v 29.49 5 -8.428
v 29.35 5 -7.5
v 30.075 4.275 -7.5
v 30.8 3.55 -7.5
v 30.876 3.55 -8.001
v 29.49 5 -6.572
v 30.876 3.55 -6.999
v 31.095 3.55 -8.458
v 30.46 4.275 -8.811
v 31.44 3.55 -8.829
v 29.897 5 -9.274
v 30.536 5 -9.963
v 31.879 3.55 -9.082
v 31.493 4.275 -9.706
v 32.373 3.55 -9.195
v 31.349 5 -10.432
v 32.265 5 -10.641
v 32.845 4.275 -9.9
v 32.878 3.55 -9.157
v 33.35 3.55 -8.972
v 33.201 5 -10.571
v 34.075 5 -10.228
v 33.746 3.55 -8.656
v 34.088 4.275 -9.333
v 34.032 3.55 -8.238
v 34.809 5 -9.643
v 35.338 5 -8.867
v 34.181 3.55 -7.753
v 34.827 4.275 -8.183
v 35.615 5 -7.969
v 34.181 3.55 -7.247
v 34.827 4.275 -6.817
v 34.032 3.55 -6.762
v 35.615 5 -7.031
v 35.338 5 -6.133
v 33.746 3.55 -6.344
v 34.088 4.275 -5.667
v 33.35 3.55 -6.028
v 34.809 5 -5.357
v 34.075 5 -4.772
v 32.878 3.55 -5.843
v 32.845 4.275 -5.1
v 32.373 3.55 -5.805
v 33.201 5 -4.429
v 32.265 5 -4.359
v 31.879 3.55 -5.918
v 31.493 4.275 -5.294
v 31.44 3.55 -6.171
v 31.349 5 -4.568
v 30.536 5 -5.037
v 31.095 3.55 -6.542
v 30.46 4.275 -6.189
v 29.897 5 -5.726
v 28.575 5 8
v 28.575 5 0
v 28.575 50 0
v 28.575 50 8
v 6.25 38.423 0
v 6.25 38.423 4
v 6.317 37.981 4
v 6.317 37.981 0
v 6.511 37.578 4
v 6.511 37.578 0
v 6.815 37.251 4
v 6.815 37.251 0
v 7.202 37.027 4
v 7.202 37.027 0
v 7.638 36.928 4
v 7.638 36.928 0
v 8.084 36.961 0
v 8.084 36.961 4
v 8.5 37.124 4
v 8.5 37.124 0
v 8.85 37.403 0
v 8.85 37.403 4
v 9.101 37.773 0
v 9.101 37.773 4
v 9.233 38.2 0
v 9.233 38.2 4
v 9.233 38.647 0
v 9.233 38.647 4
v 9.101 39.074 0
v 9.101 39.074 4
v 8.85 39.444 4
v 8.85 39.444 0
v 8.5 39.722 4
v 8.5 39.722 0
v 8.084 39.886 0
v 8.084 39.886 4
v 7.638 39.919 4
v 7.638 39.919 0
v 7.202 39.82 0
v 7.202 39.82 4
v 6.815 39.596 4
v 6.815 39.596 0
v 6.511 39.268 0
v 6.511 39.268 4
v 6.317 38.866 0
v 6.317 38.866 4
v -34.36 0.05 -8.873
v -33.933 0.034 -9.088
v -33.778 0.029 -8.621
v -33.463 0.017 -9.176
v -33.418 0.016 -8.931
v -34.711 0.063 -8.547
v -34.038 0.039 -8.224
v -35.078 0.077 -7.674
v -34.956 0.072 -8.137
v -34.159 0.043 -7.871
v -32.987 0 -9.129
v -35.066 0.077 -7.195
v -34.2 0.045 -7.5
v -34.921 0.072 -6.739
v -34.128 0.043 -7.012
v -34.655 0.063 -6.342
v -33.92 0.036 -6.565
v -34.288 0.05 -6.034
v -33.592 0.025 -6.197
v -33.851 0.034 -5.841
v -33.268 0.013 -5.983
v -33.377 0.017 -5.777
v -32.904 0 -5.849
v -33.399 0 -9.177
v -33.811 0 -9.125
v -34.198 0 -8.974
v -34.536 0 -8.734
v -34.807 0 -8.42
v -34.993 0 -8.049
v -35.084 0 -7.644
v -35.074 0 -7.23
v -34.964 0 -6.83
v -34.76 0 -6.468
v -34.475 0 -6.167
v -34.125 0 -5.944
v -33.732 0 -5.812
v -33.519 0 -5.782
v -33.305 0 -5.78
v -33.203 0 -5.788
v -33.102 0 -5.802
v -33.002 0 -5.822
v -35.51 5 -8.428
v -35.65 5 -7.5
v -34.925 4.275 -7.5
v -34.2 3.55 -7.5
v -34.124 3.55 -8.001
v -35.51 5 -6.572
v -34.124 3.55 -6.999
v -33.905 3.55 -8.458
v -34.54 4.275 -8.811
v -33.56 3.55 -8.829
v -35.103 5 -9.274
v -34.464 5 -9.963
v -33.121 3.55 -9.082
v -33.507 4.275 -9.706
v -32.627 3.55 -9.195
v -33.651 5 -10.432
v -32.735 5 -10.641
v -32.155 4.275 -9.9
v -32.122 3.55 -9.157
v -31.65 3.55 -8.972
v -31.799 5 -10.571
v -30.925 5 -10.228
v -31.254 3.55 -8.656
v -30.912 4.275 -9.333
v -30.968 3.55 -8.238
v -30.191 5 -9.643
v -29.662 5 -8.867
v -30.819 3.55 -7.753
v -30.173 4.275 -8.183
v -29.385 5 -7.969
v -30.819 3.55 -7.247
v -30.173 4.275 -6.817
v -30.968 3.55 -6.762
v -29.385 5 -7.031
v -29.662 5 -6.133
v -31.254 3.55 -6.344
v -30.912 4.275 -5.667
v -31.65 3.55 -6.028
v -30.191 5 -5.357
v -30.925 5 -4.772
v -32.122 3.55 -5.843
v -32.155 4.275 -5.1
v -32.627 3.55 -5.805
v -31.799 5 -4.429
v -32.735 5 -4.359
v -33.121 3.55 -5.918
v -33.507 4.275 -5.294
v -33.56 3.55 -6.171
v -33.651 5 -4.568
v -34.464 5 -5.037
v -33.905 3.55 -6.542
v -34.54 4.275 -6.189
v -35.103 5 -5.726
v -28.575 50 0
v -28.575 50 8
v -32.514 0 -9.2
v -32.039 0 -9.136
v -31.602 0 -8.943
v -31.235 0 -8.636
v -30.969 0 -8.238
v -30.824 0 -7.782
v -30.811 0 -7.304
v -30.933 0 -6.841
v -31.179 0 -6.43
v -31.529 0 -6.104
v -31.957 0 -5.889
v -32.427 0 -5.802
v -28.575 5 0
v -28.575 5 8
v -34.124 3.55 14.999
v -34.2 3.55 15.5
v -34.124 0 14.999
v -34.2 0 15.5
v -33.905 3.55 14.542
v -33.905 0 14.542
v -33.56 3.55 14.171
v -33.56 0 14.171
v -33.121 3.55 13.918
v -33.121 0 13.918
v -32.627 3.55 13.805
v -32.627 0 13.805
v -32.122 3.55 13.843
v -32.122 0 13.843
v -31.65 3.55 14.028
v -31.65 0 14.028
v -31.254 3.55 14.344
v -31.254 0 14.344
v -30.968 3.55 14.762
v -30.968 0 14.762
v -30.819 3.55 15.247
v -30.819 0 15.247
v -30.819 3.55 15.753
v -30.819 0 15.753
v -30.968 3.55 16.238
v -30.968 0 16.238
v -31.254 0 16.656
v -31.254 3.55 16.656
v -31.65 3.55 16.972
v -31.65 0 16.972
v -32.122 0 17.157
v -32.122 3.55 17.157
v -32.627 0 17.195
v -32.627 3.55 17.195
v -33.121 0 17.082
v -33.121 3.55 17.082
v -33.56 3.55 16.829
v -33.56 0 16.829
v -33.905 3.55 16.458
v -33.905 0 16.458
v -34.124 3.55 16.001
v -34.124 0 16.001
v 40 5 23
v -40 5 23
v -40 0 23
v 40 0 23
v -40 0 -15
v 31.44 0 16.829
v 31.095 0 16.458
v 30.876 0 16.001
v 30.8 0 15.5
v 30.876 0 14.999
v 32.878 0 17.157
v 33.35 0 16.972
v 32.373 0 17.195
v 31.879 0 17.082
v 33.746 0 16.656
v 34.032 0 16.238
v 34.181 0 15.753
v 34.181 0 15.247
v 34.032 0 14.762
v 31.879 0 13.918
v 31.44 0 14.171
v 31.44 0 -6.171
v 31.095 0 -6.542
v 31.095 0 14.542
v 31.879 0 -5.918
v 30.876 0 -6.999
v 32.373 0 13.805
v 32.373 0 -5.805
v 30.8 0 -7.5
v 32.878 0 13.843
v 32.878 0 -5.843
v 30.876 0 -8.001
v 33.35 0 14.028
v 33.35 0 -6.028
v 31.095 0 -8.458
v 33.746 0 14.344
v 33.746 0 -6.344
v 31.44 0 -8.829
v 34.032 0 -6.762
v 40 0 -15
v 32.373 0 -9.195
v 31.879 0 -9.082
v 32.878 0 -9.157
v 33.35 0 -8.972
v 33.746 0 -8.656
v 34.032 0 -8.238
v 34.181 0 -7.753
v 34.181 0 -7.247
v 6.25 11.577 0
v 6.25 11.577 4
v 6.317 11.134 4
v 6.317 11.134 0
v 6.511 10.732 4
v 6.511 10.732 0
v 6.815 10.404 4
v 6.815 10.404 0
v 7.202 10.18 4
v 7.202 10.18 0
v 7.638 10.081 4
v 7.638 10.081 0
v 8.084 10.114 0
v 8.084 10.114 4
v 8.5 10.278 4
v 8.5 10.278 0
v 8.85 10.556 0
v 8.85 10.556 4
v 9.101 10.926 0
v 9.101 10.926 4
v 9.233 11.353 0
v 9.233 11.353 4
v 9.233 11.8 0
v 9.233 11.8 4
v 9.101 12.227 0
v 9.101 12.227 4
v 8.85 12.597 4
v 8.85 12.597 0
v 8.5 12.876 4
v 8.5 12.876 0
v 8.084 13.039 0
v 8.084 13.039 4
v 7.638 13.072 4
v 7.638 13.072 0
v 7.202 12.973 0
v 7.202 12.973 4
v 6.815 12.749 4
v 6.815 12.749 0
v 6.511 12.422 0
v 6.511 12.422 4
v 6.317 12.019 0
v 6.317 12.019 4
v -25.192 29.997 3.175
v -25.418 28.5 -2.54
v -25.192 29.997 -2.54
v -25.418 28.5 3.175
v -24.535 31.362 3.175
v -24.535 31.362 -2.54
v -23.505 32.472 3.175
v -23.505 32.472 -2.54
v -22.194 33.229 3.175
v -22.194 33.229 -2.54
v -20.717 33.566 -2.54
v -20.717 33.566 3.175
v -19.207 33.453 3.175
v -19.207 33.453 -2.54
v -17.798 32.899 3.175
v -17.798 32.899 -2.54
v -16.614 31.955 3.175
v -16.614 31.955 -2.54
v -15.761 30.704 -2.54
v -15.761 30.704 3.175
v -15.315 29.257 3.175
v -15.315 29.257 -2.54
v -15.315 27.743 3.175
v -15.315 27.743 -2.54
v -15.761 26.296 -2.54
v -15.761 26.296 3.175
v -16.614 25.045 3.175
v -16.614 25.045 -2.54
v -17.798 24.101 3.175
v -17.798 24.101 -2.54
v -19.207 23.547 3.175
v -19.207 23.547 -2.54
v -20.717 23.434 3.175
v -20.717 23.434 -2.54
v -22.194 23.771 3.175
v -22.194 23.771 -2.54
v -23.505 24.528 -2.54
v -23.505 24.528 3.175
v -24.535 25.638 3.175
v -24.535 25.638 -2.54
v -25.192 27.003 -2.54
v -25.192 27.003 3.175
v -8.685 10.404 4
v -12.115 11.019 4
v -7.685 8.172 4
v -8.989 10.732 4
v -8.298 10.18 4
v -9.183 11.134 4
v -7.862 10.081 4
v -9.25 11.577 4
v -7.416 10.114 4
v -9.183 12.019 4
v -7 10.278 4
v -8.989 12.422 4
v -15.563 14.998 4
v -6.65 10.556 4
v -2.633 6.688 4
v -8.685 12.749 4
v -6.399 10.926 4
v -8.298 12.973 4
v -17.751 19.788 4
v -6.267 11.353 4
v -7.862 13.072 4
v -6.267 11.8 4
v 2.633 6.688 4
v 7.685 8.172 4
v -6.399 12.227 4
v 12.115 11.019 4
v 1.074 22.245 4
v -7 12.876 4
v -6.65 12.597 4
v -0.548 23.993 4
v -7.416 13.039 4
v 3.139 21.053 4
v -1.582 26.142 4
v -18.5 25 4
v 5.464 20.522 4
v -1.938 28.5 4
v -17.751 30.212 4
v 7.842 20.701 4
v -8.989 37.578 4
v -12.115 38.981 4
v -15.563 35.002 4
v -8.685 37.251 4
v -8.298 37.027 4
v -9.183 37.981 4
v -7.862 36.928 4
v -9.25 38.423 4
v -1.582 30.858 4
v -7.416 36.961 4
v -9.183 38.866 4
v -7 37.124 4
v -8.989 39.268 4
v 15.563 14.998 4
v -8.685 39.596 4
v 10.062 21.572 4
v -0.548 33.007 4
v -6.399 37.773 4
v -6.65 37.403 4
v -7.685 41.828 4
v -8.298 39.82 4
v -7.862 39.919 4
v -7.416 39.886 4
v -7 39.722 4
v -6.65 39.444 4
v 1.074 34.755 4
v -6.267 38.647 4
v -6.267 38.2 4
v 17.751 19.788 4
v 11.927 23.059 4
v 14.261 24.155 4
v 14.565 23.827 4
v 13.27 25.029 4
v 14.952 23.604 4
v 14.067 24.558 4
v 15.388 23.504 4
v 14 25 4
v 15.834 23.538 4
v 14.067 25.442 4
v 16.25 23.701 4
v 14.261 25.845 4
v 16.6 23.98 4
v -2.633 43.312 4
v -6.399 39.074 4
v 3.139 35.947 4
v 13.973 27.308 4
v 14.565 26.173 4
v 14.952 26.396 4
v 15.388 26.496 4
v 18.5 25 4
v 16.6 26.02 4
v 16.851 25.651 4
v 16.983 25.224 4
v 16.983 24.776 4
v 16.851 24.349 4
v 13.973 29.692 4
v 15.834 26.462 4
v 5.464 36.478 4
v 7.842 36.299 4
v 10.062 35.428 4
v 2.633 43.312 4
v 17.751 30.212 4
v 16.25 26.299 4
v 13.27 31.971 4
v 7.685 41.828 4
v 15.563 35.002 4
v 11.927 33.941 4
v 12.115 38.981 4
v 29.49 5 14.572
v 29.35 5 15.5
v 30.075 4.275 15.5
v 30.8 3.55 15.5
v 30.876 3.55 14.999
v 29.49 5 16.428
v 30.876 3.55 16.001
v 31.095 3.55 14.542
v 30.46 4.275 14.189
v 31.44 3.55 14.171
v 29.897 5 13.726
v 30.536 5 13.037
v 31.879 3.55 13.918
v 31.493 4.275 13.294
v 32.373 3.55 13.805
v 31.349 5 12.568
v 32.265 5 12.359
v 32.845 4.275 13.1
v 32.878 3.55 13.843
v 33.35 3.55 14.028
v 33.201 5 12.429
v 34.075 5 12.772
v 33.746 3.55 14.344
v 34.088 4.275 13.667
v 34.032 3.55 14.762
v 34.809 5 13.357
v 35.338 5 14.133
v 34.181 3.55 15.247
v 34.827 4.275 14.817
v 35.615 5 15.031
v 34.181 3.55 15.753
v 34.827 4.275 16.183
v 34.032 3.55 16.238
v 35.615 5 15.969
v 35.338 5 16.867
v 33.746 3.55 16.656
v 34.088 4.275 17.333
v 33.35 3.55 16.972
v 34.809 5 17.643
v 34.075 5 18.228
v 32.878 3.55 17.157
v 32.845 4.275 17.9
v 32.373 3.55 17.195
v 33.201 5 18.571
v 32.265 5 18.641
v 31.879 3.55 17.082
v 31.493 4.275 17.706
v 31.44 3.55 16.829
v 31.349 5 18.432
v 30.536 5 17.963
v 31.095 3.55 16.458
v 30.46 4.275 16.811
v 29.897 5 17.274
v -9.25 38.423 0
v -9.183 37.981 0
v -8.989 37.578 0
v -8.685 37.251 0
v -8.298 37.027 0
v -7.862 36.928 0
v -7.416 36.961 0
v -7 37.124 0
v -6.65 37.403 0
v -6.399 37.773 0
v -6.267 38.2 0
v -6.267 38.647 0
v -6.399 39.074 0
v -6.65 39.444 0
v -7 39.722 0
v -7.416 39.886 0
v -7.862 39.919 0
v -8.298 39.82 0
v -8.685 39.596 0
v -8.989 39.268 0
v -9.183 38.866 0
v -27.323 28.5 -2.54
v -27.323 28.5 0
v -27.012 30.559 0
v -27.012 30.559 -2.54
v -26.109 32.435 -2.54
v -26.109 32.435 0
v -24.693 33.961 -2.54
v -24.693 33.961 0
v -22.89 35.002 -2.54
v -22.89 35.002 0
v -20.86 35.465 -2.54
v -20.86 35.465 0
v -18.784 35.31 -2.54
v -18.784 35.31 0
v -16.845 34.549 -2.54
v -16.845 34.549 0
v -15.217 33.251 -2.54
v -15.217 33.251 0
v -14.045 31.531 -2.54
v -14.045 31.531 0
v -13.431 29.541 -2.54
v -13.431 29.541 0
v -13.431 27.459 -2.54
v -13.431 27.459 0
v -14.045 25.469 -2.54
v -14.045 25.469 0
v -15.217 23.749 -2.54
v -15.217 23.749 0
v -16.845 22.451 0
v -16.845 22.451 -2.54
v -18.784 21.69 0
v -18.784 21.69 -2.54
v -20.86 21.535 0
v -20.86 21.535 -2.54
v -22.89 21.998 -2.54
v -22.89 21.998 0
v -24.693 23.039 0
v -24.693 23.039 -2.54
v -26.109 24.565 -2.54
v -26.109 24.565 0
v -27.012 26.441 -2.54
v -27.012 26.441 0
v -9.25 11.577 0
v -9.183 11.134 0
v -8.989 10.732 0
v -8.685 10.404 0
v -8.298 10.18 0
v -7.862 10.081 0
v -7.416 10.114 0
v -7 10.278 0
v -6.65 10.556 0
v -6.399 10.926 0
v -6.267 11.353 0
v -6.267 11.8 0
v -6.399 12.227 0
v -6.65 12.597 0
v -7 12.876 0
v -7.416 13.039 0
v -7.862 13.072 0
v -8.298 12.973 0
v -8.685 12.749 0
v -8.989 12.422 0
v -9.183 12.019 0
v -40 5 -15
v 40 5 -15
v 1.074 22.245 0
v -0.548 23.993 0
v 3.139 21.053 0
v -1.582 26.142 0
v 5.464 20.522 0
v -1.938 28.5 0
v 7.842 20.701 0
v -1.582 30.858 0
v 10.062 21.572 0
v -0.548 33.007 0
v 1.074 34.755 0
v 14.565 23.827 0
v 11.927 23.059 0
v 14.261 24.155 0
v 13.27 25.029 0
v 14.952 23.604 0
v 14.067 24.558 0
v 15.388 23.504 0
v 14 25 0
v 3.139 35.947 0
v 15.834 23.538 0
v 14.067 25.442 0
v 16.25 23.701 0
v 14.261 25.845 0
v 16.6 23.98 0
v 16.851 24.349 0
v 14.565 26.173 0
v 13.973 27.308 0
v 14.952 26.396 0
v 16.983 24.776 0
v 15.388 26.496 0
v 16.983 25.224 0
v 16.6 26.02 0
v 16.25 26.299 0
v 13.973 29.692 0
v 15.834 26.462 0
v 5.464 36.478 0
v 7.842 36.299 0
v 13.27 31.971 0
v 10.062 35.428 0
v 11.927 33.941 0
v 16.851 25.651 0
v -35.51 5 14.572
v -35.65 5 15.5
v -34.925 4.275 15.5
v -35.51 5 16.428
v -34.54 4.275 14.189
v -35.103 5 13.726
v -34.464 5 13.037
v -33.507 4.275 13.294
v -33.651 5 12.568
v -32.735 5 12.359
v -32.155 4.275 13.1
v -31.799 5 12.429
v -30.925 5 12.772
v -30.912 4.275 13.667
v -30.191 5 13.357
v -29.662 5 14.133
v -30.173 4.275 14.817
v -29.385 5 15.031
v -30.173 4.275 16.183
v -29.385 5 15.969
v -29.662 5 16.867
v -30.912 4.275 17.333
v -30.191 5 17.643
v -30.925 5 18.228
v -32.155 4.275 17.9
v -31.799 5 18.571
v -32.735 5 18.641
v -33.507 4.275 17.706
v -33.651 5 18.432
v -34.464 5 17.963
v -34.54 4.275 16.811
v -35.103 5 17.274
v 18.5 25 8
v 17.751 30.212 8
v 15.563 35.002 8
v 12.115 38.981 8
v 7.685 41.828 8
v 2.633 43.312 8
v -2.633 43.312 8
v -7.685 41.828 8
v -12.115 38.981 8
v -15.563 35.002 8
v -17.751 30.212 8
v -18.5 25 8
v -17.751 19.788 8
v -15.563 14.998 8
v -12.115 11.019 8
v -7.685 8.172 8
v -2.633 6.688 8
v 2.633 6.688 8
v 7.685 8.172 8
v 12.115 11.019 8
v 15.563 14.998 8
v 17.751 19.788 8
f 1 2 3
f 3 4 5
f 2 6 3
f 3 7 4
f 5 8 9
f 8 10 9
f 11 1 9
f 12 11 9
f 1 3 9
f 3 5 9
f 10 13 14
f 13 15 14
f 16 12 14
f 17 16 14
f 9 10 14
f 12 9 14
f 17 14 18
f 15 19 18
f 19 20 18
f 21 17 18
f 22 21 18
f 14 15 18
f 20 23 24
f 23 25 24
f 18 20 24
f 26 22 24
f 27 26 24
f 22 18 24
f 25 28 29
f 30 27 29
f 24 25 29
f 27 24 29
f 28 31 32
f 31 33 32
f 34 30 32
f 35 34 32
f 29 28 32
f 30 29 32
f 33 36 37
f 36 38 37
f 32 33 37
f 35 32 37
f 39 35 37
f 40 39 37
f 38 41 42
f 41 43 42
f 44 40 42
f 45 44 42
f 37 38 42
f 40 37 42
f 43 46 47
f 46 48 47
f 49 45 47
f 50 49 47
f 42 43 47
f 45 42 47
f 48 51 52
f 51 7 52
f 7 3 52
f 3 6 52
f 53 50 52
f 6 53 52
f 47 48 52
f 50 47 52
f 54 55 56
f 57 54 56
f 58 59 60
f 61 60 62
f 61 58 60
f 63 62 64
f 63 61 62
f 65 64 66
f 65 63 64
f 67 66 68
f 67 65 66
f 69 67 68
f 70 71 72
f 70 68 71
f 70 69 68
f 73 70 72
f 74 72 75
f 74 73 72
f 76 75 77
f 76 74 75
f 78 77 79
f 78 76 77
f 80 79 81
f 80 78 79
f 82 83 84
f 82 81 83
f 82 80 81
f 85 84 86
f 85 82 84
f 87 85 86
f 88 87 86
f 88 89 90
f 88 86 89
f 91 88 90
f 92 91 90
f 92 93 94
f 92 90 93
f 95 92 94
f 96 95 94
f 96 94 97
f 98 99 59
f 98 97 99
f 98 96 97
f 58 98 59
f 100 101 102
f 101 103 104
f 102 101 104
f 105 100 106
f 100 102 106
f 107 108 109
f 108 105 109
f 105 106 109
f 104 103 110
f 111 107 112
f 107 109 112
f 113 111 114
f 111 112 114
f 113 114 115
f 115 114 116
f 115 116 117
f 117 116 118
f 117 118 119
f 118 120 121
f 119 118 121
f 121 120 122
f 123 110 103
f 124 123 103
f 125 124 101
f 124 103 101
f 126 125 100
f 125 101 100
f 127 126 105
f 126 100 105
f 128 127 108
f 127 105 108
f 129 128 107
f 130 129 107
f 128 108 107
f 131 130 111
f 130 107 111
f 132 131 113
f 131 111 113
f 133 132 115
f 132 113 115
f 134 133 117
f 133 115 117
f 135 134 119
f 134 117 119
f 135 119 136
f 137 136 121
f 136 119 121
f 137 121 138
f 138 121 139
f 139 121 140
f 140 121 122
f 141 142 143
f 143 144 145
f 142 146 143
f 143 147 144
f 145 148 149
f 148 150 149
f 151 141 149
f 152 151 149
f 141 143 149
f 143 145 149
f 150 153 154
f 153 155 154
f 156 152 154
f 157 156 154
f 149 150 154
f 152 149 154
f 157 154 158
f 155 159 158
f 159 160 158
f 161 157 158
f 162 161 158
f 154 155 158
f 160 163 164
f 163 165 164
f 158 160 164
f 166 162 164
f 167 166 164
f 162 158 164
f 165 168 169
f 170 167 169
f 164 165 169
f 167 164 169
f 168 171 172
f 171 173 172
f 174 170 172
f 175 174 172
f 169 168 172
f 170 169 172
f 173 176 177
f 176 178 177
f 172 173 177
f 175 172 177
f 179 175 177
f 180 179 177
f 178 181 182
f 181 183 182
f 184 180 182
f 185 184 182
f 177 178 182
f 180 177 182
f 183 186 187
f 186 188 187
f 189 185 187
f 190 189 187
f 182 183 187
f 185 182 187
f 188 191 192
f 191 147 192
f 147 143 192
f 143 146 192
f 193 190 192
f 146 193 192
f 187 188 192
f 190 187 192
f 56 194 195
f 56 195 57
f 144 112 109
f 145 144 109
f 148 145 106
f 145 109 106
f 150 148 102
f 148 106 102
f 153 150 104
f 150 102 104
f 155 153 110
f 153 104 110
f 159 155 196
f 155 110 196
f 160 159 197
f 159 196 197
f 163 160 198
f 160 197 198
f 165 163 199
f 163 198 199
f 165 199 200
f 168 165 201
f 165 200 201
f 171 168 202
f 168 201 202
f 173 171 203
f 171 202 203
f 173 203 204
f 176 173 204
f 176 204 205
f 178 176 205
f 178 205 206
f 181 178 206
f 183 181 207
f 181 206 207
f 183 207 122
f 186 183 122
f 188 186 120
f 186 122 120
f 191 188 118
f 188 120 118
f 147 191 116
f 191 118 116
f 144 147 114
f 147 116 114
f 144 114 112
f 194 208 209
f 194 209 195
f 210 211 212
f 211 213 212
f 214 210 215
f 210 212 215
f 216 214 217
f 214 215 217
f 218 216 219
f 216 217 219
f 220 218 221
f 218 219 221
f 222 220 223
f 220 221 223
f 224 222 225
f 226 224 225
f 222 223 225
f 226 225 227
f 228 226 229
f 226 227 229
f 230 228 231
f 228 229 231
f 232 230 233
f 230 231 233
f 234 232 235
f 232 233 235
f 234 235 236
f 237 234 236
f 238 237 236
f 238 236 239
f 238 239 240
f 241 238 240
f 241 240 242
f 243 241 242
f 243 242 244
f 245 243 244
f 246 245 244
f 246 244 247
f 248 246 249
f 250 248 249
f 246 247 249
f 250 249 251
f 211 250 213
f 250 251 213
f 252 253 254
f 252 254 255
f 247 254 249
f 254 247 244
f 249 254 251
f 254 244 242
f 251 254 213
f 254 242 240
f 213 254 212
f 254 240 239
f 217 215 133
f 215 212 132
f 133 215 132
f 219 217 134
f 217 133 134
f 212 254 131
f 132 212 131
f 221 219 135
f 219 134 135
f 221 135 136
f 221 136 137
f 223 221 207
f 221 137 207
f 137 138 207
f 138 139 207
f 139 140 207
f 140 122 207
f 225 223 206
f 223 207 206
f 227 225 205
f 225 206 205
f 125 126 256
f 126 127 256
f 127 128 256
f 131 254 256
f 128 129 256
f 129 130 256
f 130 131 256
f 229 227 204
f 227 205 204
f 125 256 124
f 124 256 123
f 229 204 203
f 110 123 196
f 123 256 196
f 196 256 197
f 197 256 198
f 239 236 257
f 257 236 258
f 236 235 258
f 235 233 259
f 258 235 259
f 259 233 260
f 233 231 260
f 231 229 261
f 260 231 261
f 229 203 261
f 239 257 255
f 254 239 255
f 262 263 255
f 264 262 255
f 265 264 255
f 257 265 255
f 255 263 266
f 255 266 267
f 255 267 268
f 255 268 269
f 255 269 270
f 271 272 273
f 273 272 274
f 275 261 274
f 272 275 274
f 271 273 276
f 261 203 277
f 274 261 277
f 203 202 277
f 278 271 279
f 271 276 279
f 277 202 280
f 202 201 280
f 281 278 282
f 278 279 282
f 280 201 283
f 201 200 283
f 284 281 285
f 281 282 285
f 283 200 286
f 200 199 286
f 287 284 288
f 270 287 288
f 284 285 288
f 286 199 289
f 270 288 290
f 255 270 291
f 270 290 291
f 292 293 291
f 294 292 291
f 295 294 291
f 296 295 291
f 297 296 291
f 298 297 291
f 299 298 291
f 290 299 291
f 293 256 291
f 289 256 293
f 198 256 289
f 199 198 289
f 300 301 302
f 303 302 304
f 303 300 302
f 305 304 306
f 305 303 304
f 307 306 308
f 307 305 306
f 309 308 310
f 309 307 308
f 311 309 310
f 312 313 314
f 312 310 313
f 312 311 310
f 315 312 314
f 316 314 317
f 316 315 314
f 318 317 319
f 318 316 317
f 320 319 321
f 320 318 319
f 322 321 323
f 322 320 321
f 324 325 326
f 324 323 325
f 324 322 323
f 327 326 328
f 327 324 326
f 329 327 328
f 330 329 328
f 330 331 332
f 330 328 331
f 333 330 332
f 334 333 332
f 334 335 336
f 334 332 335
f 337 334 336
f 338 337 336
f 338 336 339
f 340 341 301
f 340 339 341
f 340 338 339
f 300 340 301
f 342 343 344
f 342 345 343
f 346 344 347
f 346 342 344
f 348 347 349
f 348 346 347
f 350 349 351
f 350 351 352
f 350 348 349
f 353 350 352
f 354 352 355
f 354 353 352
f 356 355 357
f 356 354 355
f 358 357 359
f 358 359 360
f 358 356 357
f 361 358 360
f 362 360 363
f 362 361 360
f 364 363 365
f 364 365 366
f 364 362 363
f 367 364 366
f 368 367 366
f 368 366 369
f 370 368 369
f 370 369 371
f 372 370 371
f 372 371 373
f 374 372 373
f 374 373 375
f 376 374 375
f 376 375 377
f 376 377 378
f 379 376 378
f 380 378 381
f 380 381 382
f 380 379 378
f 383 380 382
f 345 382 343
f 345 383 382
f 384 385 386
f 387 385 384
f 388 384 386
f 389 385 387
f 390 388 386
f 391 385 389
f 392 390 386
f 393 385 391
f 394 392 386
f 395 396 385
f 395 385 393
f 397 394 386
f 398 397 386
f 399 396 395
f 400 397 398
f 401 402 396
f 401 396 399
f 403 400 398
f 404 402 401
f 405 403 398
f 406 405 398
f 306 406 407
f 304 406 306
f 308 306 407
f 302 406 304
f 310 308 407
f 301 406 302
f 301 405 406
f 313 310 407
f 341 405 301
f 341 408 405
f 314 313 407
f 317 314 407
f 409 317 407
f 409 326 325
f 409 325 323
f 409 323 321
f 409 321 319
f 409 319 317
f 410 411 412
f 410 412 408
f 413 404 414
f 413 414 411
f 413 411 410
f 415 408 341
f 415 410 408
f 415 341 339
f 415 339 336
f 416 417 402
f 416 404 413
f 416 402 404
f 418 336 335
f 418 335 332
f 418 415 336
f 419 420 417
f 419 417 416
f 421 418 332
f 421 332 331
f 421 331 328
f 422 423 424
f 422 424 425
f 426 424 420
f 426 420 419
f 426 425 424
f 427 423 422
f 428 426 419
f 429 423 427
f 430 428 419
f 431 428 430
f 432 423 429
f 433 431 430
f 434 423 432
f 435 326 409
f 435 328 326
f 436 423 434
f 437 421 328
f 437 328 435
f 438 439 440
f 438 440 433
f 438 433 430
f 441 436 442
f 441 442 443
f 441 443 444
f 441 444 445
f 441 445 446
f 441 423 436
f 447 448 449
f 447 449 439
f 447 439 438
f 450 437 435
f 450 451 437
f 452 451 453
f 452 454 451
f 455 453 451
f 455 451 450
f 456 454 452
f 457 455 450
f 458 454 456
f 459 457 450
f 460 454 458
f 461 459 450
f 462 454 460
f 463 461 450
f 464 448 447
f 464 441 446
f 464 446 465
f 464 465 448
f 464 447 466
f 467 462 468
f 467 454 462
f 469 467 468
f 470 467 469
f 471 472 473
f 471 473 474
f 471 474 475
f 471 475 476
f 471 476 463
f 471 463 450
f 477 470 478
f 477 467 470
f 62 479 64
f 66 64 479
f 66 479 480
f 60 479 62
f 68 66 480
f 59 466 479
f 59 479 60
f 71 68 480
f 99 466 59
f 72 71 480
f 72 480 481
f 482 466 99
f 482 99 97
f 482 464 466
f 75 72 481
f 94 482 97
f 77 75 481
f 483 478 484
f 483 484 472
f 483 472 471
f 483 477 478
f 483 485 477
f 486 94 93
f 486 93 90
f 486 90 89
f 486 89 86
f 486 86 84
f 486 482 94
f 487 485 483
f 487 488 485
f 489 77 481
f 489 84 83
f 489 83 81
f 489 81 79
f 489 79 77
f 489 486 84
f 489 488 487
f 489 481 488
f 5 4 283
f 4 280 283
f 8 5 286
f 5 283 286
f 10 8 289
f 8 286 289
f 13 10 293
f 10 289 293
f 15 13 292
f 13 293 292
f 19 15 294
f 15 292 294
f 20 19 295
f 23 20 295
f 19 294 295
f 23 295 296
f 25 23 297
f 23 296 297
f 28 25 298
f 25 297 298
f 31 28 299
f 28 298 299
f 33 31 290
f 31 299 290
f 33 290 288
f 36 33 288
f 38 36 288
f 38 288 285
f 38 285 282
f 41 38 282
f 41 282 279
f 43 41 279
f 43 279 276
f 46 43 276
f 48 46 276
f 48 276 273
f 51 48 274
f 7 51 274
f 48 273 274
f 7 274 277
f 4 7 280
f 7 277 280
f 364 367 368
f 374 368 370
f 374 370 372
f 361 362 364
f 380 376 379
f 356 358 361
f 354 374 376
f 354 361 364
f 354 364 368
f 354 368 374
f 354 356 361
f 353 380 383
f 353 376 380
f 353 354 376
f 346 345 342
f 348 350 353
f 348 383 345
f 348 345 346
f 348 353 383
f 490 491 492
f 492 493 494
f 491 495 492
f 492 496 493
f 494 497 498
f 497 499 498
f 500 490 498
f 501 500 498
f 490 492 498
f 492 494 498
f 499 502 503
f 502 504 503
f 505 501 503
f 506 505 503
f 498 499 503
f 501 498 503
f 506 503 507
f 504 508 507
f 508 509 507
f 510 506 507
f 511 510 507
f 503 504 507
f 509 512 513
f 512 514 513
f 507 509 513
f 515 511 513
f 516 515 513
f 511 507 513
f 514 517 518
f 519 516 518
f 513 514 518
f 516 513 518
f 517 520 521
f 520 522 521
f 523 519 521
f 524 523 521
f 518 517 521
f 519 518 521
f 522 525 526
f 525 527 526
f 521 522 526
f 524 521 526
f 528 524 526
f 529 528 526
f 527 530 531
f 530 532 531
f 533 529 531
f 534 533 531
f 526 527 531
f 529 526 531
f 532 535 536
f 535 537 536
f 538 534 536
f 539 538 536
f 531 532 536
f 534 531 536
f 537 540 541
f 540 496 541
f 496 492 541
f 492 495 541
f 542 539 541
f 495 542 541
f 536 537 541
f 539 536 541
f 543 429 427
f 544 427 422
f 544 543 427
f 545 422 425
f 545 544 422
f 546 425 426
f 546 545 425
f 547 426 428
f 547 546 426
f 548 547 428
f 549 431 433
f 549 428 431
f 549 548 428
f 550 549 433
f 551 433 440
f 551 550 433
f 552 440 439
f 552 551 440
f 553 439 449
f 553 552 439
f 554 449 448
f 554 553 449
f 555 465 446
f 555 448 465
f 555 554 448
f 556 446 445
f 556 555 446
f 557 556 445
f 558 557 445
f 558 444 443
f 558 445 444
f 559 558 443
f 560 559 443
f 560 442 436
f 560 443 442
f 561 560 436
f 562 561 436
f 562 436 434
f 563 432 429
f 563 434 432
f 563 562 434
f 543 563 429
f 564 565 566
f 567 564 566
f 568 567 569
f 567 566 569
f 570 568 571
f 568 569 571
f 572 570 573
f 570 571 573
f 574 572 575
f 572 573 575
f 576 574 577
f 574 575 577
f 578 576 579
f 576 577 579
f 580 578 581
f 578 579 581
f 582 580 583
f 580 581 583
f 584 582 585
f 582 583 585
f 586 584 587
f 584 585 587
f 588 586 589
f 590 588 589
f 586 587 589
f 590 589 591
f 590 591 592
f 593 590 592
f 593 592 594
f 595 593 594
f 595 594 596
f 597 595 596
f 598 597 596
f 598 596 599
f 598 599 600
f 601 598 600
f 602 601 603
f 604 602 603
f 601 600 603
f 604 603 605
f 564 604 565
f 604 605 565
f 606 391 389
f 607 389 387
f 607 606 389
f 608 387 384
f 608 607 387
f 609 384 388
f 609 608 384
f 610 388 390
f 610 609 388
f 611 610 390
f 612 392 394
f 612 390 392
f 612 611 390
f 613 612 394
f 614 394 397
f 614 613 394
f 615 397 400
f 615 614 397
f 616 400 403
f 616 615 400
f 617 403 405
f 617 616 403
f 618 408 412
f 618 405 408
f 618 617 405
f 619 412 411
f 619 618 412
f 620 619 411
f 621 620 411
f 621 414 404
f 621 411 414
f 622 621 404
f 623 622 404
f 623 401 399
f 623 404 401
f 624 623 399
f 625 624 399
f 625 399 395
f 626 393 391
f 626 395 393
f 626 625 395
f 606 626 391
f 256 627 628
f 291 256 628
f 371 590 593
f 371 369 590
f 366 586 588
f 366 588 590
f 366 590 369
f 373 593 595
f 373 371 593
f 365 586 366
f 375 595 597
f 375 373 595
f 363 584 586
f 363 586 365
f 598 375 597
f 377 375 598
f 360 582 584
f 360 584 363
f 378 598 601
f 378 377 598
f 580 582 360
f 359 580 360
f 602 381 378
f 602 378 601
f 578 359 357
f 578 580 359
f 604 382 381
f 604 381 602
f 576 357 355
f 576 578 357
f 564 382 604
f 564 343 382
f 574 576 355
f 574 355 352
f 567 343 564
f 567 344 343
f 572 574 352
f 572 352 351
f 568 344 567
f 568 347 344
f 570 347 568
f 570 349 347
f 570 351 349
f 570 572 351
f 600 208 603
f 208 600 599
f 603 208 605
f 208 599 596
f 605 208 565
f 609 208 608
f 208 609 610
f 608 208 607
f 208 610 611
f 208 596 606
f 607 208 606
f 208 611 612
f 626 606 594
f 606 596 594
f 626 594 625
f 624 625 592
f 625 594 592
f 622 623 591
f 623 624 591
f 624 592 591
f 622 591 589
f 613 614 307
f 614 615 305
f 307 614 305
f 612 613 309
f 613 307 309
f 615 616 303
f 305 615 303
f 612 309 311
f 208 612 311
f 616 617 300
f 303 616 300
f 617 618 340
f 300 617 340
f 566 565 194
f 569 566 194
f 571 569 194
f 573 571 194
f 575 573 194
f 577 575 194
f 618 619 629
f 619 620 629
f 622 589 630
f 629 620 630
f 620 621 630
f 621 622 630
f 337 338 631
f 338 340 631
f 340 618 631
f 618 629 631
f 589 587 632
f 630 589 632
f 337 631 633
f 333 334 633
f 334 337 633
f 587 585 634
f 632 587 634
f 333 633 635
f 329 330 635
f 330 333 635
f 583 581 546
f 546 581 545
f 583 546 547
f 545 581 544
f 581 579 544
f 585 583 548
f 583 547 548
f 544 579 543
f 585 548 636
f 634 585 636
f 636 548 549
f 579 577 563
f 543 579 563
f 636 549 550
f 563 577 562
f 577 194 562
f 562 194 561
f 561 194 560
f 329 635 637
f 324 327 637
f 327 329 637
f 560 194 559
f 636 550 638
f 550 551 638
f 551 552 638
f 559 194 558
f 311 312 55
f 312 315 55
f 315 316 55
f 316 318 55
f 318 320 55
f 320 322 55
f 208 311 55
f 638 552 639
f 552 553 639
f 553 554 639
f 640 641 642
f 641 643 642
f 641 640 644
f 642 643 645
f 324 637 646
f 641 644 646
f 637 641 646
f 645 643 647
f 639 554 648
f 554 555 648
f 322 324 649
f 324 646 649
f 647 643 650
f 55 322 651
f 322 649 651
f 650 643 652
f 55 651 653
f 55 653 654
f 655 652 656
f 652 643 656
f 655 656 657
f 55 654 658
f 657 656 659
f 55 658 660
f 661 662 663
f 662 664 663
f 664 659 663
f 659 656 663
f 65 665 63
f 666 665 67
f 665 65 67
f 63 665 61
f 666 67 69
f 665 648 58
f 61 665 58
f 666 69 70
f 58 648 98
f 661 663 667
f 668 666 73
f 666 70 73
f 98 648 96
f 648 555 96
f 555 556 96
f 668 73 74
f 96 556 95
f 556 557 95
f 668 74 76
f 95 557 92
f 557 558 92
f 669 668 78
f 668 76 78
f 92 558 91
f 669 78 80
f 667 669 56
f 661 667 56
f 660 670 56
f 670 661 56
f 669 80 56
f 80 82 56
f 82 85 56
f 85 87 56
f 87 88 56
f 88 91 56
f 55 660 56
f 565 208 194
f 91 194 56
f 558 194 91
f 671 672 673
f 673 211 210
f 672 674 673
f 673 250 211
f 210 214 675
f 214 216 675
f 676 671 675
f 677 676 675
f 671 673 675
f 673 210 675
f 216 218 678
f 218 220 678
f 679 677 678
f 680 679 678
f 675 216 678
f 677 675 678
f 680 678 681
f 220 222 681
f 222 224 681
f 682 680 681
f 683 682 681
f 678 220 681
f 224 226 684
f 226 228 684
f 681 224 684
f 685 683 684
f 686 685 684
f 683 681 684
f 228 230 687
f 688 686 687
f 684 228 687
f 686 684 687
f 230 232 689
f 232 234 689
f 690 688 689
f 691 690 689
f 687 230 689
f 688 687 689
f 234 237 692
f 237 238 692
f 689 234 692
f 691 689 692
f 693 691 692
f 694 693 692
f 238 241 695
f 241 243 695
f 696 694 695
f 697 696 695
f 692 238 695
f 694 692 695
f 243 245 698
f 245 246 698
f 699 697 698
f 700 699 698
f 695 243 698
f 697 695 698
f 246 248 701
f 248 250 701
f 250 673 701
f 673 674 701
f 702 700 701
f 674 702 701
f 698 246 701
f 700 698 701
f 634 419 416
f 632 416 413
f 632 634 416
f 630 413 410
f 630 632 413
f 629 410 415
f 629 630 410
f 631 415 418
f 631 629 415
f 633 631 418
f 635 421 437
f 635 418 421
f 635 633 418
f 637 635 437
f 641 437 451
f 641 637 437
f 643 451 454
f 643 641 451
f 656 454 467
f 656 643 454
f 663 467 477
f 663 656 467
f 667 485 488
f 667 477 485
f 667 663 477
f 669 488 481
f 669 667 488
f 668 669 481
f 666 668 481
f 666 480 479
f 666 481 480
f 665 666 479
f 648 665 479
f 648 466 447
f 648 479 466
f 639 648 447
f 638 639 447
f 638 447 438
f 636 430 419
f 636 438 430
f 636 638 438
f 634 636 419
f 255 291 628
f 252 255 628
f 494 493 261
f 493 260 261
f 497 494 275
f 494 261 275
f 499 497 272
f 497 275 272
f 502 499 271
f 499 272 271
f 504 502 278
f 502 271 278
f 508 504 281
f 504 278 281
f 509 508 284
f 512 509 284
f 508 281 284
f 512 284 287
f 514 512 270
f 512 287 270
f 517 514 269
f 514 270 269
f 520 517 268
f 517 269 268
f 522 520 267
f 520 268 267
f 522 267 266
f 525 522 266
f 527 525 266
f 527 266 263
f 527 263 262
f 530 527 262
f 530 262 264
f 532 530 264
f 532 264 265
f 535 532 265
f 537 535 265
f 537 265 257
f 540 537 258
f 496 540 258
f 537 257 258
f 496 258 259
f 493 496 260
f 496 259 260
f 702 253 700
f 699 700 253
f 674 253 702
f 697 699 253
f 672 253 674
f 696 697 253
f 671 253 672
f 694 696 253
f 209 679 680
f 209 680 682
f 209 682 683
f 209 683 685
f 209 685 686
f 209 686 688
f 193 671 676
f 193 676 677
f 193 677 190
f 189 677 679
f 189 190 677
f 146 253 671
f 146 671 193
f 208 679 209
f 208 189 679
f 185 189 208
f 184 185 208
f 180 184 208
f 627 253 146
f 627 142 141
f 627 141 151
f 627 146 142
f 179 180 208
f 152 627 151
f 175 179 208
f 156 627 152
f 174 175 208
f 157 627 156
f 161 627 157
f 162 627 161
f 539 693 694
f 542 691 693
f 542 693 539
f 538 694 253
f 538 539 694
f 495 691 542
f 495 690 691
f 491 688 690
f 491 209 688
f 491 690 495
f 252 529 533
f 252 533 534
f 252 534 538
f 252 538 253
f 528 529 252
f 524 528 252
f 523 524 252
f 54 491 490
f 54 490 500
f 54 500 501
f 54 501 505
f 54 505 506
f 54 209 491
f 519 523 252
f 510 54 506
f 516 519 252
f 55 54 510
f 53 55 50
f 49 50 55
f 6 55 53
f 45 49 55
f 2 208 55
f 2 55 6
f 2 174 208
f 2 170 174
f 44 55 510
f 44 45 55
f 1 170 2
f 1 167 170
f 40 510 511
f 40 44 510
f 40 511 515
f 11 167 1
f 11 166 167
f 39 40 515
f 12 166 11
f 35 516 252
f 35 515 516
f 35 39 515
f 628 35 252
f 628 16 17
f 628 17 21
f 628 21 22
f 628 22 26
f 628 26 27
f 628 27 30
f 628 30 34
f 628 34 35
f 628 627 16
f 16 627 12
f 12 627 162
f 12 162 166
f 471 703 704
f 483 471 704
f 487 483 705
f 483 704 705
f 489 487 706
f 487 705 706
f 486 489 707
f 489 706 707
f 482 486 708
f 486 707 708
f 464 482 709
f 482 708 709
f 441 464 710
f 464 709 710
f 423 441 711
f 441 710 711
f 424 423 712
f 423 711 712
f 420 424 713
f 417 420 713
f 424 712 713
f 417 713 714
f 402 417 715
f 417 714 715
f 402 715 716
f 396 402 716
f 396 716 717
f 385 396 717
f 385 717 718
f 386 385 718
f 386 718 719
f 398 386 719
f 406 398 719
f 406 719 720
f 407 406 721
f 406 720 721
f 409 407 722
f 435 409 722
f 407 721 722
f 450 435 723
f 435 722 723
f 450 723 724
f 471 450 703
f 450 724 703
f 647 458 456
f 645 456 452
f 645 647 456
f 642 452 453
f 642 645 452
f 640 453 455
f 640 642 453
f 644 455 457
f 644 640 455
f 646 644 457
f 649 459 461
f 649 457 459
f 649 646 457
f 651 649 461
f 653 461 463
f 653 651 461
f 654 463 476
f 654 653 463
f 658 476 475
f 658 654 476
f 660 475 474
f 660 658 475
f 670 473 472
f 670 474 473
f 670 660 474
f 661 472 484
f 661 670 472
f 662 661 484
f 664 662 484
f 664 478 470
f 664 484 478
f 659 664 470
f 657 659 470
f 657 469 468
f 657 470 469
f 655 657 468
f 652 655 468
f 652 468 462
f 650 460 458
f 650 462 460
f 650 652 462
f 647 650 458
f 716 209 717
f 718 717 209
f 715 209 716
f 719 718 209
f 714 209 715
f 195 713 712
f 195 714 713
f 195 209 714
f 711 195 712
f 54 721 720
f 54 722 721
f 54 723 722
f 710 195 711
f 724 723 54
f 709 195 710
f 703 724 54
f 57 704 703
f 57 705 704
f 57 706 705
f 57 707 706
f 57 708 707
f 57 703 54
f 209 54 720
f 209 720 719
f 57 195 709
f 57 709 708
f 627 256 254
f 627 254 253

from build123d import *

# Parameters (mm, degrees)
SKETCH3_W                                       = 57.15
SKETCH3_H                                       = 50
BOSS_EXTRUDE1_DEPTH                             = 8
SKETCH3_3_R                                     = 1.5
SKETCH3_3_R_2                                   = 8
CUT_EXTRUDE2_DEPTH                              = 10
SKETCH4_R                                       = 18.5
CUT_EXTRUDE3_DEPTH                              = 4
BOSS_EXTRUDE2_DEPTH                             = 15
BOSS_EXTRUDE2_DEPTH_BACK                        = 23
SKETCH6_W                                       = 80
SKETCH6_H                                       = 5
CSK_FOR_M3_FLAT_HEAD_MACHINE_SCREW1_D           = 3.4
CSK_FOR_M3_FLAT_HEAD_MACHINE_SCREW1_CSINK_D     = 6.3
CSK_FOR_M3_FLAT_HEAD_MACHINE_SCREW1_CSINK_ANGLE = 90
SKETCH13_R                                      = 6.985
SKETCH13_R_2                                    = 5.08
BOSS_EXTRUDE4_DEPTH                             = 2.54
CUT_EXTRUDE6_REACH                              = 544.7
SKETCH16_R                                      = 1.7
CUT_EXTRUDE7_START                              = -3.175
SKETCH13_2_R                                    = 5.08
CUT_EXTRUDE7_DEPTH                              = 3.175


with BuildPart() as part:
    # Sketch3 → Boss-Extrude1 (new body)
    with BuildSketch(Plane.XY):
        with Locations((0, 25)):
            Rectangle(SKETCH3_W, SKETCH3_H)
    extrude(amount=BOSS_EXTRUDE1_DEPTH)

    # Sketch3<3> → Cut-Extrude2 (cut)
    with BuildSketch(Plane.XY):
        with Locations(Location((-7.75, 38.423393759, 0), (0, 0, 180))):
            Circle(SKETCH3_3_R)
        with Locations(Location((7.75, 38.423393759, 0), (0, 0, 180))):
            Circle(SKETCH3_3_R)
        with Locations(Location((-7.75, 11.576606241, 0), (0, 0, 180))):
            Circle(SKETCH3_3_R)
        with Locations(Location((7.75, 11.576606241, 0), (0, 0, 180))):
            Circle(SKETCH3_3_R)
        with Locations(Location((15.5, 25, 0), (0, 0, 180))):
            Circle(SKETCH3_3_R)
        with Locations(Location((6.062177825, 28.499999999, 0), (0, 0, 180))):
            Circle(SKETCH3_3_R_2)
    extrude(amount=CUT_EXTRUDE2_DEPTH, mode=Mode.SUBTRACT)

    # Sketch4 → Cut-Extrude3 (cut)
    with BuildSketch(Plane.XY.offset(8)):
        with Locations((0, 25)):
            Circle(SKETCH4_R)
    extrude(amount=-CUT_EXTRUDE3_DEPTH, mode=Mode.SUBTRACT)

    # Sketch6 → Boss-Extrude2 (add, two sides: drawn at the far end of the back side and taken through both)
    with BuildSketch(Plane.XY.offset(8).offset(-BOSS_EXTRUDE2_DEPTH_BACK)):
        with Locations((0, 2.5)):
            Rectangle(SKETCH6_W, SKETCH6_H)
    extrude(amount=BOSS_EXTRUDE2_DEPTH + BOSS_EXTRUDE2_DEPTH_BACK)

    # CSK for M3 Flat Head Machine Screw1 (through all)
    with Locations(Plane(origin=(0, 5, 0), x_dir=(1, 0, 0), z_dir=(0, 1, 0))):
        with Locations((-32.5, 7.5), (-32.5, -15.5), (32.5, -15.5), (32.5, 7.5)):
            CounterSinkHole(CSK_FOR_M3_FLAT_HEAD_MACHINE_SCREW1_D / 2, CSK_FOR_M3_FLAT_HEAD_MACHINE_SCREW1_CSINK_D / 2, counter_sink_angle=CSK_FOR_M3_FLAT_HEAD_MACHINE_SCREW1_CSINK_ANGLE)

    # Sketch13 → Boss-Extrude4 (add)
    with BuildSketch(Plane(origin=(0, 0, 0), x_dir=(-1, 0, 0), z_dir=(0, 0, -1))):
        with Locations((20.337822175, 28.499999999)):
            Circle(SKETCH13_R)
        with Locations((20.337822175, 28.499999999)):
            Circle(SKETCH13_R_2, mode=Mode.SUBTRACT)
    extrude(amount=BOSS_EXTRUDE4_DEPTH)

    # Sketch16 → Cut-Extrude6 (cut, up to next)
    with BuildSketch(Plane(origin=(-499.248949842, 16.821159134, -28.308871479), x_dir=(0.05083085086369645, -0.0009181581696577923, 0.9987068546806156), z_dir=(0.03609088653191216, 0.9993480899541042, -0.0009181581696584952)), mode=Mode.PRIVATE) as cut_extrude6_sk1:
        with Locations((44.5, 464.499999998)):
            Circle(SKETCH16_R)
    cut_extrude6_tool1 = extrude(cut_extrude6_sk1.sketch, amount=-CUT_EXTRUDE6_REACH, mode=Mode.PRIVATE) & part.part
    add(cut_extrude6_tool1.solids().sort_by_distance((-33.390455, 0.016084, -7.477347))[0], mode=Mode.SUBTRACT)

    # Sketch13<2> → Cut-Extrude7 (cut)
    with BuildSketch(Plane(origin=(0, 0, 0), x_dir=(-1, 0, 0), z_dir=(0, 0, -1)).offset(CUT_EXTRUDE7_START)):
        with Locations((20.337822175, 28.499999999)):
            Circle(SKETCH13_2_R)
    extrude(amount=CUT_EXTRUDE7_DEPTH, mode=Mode.SUBTRACT)


solid = part.part
